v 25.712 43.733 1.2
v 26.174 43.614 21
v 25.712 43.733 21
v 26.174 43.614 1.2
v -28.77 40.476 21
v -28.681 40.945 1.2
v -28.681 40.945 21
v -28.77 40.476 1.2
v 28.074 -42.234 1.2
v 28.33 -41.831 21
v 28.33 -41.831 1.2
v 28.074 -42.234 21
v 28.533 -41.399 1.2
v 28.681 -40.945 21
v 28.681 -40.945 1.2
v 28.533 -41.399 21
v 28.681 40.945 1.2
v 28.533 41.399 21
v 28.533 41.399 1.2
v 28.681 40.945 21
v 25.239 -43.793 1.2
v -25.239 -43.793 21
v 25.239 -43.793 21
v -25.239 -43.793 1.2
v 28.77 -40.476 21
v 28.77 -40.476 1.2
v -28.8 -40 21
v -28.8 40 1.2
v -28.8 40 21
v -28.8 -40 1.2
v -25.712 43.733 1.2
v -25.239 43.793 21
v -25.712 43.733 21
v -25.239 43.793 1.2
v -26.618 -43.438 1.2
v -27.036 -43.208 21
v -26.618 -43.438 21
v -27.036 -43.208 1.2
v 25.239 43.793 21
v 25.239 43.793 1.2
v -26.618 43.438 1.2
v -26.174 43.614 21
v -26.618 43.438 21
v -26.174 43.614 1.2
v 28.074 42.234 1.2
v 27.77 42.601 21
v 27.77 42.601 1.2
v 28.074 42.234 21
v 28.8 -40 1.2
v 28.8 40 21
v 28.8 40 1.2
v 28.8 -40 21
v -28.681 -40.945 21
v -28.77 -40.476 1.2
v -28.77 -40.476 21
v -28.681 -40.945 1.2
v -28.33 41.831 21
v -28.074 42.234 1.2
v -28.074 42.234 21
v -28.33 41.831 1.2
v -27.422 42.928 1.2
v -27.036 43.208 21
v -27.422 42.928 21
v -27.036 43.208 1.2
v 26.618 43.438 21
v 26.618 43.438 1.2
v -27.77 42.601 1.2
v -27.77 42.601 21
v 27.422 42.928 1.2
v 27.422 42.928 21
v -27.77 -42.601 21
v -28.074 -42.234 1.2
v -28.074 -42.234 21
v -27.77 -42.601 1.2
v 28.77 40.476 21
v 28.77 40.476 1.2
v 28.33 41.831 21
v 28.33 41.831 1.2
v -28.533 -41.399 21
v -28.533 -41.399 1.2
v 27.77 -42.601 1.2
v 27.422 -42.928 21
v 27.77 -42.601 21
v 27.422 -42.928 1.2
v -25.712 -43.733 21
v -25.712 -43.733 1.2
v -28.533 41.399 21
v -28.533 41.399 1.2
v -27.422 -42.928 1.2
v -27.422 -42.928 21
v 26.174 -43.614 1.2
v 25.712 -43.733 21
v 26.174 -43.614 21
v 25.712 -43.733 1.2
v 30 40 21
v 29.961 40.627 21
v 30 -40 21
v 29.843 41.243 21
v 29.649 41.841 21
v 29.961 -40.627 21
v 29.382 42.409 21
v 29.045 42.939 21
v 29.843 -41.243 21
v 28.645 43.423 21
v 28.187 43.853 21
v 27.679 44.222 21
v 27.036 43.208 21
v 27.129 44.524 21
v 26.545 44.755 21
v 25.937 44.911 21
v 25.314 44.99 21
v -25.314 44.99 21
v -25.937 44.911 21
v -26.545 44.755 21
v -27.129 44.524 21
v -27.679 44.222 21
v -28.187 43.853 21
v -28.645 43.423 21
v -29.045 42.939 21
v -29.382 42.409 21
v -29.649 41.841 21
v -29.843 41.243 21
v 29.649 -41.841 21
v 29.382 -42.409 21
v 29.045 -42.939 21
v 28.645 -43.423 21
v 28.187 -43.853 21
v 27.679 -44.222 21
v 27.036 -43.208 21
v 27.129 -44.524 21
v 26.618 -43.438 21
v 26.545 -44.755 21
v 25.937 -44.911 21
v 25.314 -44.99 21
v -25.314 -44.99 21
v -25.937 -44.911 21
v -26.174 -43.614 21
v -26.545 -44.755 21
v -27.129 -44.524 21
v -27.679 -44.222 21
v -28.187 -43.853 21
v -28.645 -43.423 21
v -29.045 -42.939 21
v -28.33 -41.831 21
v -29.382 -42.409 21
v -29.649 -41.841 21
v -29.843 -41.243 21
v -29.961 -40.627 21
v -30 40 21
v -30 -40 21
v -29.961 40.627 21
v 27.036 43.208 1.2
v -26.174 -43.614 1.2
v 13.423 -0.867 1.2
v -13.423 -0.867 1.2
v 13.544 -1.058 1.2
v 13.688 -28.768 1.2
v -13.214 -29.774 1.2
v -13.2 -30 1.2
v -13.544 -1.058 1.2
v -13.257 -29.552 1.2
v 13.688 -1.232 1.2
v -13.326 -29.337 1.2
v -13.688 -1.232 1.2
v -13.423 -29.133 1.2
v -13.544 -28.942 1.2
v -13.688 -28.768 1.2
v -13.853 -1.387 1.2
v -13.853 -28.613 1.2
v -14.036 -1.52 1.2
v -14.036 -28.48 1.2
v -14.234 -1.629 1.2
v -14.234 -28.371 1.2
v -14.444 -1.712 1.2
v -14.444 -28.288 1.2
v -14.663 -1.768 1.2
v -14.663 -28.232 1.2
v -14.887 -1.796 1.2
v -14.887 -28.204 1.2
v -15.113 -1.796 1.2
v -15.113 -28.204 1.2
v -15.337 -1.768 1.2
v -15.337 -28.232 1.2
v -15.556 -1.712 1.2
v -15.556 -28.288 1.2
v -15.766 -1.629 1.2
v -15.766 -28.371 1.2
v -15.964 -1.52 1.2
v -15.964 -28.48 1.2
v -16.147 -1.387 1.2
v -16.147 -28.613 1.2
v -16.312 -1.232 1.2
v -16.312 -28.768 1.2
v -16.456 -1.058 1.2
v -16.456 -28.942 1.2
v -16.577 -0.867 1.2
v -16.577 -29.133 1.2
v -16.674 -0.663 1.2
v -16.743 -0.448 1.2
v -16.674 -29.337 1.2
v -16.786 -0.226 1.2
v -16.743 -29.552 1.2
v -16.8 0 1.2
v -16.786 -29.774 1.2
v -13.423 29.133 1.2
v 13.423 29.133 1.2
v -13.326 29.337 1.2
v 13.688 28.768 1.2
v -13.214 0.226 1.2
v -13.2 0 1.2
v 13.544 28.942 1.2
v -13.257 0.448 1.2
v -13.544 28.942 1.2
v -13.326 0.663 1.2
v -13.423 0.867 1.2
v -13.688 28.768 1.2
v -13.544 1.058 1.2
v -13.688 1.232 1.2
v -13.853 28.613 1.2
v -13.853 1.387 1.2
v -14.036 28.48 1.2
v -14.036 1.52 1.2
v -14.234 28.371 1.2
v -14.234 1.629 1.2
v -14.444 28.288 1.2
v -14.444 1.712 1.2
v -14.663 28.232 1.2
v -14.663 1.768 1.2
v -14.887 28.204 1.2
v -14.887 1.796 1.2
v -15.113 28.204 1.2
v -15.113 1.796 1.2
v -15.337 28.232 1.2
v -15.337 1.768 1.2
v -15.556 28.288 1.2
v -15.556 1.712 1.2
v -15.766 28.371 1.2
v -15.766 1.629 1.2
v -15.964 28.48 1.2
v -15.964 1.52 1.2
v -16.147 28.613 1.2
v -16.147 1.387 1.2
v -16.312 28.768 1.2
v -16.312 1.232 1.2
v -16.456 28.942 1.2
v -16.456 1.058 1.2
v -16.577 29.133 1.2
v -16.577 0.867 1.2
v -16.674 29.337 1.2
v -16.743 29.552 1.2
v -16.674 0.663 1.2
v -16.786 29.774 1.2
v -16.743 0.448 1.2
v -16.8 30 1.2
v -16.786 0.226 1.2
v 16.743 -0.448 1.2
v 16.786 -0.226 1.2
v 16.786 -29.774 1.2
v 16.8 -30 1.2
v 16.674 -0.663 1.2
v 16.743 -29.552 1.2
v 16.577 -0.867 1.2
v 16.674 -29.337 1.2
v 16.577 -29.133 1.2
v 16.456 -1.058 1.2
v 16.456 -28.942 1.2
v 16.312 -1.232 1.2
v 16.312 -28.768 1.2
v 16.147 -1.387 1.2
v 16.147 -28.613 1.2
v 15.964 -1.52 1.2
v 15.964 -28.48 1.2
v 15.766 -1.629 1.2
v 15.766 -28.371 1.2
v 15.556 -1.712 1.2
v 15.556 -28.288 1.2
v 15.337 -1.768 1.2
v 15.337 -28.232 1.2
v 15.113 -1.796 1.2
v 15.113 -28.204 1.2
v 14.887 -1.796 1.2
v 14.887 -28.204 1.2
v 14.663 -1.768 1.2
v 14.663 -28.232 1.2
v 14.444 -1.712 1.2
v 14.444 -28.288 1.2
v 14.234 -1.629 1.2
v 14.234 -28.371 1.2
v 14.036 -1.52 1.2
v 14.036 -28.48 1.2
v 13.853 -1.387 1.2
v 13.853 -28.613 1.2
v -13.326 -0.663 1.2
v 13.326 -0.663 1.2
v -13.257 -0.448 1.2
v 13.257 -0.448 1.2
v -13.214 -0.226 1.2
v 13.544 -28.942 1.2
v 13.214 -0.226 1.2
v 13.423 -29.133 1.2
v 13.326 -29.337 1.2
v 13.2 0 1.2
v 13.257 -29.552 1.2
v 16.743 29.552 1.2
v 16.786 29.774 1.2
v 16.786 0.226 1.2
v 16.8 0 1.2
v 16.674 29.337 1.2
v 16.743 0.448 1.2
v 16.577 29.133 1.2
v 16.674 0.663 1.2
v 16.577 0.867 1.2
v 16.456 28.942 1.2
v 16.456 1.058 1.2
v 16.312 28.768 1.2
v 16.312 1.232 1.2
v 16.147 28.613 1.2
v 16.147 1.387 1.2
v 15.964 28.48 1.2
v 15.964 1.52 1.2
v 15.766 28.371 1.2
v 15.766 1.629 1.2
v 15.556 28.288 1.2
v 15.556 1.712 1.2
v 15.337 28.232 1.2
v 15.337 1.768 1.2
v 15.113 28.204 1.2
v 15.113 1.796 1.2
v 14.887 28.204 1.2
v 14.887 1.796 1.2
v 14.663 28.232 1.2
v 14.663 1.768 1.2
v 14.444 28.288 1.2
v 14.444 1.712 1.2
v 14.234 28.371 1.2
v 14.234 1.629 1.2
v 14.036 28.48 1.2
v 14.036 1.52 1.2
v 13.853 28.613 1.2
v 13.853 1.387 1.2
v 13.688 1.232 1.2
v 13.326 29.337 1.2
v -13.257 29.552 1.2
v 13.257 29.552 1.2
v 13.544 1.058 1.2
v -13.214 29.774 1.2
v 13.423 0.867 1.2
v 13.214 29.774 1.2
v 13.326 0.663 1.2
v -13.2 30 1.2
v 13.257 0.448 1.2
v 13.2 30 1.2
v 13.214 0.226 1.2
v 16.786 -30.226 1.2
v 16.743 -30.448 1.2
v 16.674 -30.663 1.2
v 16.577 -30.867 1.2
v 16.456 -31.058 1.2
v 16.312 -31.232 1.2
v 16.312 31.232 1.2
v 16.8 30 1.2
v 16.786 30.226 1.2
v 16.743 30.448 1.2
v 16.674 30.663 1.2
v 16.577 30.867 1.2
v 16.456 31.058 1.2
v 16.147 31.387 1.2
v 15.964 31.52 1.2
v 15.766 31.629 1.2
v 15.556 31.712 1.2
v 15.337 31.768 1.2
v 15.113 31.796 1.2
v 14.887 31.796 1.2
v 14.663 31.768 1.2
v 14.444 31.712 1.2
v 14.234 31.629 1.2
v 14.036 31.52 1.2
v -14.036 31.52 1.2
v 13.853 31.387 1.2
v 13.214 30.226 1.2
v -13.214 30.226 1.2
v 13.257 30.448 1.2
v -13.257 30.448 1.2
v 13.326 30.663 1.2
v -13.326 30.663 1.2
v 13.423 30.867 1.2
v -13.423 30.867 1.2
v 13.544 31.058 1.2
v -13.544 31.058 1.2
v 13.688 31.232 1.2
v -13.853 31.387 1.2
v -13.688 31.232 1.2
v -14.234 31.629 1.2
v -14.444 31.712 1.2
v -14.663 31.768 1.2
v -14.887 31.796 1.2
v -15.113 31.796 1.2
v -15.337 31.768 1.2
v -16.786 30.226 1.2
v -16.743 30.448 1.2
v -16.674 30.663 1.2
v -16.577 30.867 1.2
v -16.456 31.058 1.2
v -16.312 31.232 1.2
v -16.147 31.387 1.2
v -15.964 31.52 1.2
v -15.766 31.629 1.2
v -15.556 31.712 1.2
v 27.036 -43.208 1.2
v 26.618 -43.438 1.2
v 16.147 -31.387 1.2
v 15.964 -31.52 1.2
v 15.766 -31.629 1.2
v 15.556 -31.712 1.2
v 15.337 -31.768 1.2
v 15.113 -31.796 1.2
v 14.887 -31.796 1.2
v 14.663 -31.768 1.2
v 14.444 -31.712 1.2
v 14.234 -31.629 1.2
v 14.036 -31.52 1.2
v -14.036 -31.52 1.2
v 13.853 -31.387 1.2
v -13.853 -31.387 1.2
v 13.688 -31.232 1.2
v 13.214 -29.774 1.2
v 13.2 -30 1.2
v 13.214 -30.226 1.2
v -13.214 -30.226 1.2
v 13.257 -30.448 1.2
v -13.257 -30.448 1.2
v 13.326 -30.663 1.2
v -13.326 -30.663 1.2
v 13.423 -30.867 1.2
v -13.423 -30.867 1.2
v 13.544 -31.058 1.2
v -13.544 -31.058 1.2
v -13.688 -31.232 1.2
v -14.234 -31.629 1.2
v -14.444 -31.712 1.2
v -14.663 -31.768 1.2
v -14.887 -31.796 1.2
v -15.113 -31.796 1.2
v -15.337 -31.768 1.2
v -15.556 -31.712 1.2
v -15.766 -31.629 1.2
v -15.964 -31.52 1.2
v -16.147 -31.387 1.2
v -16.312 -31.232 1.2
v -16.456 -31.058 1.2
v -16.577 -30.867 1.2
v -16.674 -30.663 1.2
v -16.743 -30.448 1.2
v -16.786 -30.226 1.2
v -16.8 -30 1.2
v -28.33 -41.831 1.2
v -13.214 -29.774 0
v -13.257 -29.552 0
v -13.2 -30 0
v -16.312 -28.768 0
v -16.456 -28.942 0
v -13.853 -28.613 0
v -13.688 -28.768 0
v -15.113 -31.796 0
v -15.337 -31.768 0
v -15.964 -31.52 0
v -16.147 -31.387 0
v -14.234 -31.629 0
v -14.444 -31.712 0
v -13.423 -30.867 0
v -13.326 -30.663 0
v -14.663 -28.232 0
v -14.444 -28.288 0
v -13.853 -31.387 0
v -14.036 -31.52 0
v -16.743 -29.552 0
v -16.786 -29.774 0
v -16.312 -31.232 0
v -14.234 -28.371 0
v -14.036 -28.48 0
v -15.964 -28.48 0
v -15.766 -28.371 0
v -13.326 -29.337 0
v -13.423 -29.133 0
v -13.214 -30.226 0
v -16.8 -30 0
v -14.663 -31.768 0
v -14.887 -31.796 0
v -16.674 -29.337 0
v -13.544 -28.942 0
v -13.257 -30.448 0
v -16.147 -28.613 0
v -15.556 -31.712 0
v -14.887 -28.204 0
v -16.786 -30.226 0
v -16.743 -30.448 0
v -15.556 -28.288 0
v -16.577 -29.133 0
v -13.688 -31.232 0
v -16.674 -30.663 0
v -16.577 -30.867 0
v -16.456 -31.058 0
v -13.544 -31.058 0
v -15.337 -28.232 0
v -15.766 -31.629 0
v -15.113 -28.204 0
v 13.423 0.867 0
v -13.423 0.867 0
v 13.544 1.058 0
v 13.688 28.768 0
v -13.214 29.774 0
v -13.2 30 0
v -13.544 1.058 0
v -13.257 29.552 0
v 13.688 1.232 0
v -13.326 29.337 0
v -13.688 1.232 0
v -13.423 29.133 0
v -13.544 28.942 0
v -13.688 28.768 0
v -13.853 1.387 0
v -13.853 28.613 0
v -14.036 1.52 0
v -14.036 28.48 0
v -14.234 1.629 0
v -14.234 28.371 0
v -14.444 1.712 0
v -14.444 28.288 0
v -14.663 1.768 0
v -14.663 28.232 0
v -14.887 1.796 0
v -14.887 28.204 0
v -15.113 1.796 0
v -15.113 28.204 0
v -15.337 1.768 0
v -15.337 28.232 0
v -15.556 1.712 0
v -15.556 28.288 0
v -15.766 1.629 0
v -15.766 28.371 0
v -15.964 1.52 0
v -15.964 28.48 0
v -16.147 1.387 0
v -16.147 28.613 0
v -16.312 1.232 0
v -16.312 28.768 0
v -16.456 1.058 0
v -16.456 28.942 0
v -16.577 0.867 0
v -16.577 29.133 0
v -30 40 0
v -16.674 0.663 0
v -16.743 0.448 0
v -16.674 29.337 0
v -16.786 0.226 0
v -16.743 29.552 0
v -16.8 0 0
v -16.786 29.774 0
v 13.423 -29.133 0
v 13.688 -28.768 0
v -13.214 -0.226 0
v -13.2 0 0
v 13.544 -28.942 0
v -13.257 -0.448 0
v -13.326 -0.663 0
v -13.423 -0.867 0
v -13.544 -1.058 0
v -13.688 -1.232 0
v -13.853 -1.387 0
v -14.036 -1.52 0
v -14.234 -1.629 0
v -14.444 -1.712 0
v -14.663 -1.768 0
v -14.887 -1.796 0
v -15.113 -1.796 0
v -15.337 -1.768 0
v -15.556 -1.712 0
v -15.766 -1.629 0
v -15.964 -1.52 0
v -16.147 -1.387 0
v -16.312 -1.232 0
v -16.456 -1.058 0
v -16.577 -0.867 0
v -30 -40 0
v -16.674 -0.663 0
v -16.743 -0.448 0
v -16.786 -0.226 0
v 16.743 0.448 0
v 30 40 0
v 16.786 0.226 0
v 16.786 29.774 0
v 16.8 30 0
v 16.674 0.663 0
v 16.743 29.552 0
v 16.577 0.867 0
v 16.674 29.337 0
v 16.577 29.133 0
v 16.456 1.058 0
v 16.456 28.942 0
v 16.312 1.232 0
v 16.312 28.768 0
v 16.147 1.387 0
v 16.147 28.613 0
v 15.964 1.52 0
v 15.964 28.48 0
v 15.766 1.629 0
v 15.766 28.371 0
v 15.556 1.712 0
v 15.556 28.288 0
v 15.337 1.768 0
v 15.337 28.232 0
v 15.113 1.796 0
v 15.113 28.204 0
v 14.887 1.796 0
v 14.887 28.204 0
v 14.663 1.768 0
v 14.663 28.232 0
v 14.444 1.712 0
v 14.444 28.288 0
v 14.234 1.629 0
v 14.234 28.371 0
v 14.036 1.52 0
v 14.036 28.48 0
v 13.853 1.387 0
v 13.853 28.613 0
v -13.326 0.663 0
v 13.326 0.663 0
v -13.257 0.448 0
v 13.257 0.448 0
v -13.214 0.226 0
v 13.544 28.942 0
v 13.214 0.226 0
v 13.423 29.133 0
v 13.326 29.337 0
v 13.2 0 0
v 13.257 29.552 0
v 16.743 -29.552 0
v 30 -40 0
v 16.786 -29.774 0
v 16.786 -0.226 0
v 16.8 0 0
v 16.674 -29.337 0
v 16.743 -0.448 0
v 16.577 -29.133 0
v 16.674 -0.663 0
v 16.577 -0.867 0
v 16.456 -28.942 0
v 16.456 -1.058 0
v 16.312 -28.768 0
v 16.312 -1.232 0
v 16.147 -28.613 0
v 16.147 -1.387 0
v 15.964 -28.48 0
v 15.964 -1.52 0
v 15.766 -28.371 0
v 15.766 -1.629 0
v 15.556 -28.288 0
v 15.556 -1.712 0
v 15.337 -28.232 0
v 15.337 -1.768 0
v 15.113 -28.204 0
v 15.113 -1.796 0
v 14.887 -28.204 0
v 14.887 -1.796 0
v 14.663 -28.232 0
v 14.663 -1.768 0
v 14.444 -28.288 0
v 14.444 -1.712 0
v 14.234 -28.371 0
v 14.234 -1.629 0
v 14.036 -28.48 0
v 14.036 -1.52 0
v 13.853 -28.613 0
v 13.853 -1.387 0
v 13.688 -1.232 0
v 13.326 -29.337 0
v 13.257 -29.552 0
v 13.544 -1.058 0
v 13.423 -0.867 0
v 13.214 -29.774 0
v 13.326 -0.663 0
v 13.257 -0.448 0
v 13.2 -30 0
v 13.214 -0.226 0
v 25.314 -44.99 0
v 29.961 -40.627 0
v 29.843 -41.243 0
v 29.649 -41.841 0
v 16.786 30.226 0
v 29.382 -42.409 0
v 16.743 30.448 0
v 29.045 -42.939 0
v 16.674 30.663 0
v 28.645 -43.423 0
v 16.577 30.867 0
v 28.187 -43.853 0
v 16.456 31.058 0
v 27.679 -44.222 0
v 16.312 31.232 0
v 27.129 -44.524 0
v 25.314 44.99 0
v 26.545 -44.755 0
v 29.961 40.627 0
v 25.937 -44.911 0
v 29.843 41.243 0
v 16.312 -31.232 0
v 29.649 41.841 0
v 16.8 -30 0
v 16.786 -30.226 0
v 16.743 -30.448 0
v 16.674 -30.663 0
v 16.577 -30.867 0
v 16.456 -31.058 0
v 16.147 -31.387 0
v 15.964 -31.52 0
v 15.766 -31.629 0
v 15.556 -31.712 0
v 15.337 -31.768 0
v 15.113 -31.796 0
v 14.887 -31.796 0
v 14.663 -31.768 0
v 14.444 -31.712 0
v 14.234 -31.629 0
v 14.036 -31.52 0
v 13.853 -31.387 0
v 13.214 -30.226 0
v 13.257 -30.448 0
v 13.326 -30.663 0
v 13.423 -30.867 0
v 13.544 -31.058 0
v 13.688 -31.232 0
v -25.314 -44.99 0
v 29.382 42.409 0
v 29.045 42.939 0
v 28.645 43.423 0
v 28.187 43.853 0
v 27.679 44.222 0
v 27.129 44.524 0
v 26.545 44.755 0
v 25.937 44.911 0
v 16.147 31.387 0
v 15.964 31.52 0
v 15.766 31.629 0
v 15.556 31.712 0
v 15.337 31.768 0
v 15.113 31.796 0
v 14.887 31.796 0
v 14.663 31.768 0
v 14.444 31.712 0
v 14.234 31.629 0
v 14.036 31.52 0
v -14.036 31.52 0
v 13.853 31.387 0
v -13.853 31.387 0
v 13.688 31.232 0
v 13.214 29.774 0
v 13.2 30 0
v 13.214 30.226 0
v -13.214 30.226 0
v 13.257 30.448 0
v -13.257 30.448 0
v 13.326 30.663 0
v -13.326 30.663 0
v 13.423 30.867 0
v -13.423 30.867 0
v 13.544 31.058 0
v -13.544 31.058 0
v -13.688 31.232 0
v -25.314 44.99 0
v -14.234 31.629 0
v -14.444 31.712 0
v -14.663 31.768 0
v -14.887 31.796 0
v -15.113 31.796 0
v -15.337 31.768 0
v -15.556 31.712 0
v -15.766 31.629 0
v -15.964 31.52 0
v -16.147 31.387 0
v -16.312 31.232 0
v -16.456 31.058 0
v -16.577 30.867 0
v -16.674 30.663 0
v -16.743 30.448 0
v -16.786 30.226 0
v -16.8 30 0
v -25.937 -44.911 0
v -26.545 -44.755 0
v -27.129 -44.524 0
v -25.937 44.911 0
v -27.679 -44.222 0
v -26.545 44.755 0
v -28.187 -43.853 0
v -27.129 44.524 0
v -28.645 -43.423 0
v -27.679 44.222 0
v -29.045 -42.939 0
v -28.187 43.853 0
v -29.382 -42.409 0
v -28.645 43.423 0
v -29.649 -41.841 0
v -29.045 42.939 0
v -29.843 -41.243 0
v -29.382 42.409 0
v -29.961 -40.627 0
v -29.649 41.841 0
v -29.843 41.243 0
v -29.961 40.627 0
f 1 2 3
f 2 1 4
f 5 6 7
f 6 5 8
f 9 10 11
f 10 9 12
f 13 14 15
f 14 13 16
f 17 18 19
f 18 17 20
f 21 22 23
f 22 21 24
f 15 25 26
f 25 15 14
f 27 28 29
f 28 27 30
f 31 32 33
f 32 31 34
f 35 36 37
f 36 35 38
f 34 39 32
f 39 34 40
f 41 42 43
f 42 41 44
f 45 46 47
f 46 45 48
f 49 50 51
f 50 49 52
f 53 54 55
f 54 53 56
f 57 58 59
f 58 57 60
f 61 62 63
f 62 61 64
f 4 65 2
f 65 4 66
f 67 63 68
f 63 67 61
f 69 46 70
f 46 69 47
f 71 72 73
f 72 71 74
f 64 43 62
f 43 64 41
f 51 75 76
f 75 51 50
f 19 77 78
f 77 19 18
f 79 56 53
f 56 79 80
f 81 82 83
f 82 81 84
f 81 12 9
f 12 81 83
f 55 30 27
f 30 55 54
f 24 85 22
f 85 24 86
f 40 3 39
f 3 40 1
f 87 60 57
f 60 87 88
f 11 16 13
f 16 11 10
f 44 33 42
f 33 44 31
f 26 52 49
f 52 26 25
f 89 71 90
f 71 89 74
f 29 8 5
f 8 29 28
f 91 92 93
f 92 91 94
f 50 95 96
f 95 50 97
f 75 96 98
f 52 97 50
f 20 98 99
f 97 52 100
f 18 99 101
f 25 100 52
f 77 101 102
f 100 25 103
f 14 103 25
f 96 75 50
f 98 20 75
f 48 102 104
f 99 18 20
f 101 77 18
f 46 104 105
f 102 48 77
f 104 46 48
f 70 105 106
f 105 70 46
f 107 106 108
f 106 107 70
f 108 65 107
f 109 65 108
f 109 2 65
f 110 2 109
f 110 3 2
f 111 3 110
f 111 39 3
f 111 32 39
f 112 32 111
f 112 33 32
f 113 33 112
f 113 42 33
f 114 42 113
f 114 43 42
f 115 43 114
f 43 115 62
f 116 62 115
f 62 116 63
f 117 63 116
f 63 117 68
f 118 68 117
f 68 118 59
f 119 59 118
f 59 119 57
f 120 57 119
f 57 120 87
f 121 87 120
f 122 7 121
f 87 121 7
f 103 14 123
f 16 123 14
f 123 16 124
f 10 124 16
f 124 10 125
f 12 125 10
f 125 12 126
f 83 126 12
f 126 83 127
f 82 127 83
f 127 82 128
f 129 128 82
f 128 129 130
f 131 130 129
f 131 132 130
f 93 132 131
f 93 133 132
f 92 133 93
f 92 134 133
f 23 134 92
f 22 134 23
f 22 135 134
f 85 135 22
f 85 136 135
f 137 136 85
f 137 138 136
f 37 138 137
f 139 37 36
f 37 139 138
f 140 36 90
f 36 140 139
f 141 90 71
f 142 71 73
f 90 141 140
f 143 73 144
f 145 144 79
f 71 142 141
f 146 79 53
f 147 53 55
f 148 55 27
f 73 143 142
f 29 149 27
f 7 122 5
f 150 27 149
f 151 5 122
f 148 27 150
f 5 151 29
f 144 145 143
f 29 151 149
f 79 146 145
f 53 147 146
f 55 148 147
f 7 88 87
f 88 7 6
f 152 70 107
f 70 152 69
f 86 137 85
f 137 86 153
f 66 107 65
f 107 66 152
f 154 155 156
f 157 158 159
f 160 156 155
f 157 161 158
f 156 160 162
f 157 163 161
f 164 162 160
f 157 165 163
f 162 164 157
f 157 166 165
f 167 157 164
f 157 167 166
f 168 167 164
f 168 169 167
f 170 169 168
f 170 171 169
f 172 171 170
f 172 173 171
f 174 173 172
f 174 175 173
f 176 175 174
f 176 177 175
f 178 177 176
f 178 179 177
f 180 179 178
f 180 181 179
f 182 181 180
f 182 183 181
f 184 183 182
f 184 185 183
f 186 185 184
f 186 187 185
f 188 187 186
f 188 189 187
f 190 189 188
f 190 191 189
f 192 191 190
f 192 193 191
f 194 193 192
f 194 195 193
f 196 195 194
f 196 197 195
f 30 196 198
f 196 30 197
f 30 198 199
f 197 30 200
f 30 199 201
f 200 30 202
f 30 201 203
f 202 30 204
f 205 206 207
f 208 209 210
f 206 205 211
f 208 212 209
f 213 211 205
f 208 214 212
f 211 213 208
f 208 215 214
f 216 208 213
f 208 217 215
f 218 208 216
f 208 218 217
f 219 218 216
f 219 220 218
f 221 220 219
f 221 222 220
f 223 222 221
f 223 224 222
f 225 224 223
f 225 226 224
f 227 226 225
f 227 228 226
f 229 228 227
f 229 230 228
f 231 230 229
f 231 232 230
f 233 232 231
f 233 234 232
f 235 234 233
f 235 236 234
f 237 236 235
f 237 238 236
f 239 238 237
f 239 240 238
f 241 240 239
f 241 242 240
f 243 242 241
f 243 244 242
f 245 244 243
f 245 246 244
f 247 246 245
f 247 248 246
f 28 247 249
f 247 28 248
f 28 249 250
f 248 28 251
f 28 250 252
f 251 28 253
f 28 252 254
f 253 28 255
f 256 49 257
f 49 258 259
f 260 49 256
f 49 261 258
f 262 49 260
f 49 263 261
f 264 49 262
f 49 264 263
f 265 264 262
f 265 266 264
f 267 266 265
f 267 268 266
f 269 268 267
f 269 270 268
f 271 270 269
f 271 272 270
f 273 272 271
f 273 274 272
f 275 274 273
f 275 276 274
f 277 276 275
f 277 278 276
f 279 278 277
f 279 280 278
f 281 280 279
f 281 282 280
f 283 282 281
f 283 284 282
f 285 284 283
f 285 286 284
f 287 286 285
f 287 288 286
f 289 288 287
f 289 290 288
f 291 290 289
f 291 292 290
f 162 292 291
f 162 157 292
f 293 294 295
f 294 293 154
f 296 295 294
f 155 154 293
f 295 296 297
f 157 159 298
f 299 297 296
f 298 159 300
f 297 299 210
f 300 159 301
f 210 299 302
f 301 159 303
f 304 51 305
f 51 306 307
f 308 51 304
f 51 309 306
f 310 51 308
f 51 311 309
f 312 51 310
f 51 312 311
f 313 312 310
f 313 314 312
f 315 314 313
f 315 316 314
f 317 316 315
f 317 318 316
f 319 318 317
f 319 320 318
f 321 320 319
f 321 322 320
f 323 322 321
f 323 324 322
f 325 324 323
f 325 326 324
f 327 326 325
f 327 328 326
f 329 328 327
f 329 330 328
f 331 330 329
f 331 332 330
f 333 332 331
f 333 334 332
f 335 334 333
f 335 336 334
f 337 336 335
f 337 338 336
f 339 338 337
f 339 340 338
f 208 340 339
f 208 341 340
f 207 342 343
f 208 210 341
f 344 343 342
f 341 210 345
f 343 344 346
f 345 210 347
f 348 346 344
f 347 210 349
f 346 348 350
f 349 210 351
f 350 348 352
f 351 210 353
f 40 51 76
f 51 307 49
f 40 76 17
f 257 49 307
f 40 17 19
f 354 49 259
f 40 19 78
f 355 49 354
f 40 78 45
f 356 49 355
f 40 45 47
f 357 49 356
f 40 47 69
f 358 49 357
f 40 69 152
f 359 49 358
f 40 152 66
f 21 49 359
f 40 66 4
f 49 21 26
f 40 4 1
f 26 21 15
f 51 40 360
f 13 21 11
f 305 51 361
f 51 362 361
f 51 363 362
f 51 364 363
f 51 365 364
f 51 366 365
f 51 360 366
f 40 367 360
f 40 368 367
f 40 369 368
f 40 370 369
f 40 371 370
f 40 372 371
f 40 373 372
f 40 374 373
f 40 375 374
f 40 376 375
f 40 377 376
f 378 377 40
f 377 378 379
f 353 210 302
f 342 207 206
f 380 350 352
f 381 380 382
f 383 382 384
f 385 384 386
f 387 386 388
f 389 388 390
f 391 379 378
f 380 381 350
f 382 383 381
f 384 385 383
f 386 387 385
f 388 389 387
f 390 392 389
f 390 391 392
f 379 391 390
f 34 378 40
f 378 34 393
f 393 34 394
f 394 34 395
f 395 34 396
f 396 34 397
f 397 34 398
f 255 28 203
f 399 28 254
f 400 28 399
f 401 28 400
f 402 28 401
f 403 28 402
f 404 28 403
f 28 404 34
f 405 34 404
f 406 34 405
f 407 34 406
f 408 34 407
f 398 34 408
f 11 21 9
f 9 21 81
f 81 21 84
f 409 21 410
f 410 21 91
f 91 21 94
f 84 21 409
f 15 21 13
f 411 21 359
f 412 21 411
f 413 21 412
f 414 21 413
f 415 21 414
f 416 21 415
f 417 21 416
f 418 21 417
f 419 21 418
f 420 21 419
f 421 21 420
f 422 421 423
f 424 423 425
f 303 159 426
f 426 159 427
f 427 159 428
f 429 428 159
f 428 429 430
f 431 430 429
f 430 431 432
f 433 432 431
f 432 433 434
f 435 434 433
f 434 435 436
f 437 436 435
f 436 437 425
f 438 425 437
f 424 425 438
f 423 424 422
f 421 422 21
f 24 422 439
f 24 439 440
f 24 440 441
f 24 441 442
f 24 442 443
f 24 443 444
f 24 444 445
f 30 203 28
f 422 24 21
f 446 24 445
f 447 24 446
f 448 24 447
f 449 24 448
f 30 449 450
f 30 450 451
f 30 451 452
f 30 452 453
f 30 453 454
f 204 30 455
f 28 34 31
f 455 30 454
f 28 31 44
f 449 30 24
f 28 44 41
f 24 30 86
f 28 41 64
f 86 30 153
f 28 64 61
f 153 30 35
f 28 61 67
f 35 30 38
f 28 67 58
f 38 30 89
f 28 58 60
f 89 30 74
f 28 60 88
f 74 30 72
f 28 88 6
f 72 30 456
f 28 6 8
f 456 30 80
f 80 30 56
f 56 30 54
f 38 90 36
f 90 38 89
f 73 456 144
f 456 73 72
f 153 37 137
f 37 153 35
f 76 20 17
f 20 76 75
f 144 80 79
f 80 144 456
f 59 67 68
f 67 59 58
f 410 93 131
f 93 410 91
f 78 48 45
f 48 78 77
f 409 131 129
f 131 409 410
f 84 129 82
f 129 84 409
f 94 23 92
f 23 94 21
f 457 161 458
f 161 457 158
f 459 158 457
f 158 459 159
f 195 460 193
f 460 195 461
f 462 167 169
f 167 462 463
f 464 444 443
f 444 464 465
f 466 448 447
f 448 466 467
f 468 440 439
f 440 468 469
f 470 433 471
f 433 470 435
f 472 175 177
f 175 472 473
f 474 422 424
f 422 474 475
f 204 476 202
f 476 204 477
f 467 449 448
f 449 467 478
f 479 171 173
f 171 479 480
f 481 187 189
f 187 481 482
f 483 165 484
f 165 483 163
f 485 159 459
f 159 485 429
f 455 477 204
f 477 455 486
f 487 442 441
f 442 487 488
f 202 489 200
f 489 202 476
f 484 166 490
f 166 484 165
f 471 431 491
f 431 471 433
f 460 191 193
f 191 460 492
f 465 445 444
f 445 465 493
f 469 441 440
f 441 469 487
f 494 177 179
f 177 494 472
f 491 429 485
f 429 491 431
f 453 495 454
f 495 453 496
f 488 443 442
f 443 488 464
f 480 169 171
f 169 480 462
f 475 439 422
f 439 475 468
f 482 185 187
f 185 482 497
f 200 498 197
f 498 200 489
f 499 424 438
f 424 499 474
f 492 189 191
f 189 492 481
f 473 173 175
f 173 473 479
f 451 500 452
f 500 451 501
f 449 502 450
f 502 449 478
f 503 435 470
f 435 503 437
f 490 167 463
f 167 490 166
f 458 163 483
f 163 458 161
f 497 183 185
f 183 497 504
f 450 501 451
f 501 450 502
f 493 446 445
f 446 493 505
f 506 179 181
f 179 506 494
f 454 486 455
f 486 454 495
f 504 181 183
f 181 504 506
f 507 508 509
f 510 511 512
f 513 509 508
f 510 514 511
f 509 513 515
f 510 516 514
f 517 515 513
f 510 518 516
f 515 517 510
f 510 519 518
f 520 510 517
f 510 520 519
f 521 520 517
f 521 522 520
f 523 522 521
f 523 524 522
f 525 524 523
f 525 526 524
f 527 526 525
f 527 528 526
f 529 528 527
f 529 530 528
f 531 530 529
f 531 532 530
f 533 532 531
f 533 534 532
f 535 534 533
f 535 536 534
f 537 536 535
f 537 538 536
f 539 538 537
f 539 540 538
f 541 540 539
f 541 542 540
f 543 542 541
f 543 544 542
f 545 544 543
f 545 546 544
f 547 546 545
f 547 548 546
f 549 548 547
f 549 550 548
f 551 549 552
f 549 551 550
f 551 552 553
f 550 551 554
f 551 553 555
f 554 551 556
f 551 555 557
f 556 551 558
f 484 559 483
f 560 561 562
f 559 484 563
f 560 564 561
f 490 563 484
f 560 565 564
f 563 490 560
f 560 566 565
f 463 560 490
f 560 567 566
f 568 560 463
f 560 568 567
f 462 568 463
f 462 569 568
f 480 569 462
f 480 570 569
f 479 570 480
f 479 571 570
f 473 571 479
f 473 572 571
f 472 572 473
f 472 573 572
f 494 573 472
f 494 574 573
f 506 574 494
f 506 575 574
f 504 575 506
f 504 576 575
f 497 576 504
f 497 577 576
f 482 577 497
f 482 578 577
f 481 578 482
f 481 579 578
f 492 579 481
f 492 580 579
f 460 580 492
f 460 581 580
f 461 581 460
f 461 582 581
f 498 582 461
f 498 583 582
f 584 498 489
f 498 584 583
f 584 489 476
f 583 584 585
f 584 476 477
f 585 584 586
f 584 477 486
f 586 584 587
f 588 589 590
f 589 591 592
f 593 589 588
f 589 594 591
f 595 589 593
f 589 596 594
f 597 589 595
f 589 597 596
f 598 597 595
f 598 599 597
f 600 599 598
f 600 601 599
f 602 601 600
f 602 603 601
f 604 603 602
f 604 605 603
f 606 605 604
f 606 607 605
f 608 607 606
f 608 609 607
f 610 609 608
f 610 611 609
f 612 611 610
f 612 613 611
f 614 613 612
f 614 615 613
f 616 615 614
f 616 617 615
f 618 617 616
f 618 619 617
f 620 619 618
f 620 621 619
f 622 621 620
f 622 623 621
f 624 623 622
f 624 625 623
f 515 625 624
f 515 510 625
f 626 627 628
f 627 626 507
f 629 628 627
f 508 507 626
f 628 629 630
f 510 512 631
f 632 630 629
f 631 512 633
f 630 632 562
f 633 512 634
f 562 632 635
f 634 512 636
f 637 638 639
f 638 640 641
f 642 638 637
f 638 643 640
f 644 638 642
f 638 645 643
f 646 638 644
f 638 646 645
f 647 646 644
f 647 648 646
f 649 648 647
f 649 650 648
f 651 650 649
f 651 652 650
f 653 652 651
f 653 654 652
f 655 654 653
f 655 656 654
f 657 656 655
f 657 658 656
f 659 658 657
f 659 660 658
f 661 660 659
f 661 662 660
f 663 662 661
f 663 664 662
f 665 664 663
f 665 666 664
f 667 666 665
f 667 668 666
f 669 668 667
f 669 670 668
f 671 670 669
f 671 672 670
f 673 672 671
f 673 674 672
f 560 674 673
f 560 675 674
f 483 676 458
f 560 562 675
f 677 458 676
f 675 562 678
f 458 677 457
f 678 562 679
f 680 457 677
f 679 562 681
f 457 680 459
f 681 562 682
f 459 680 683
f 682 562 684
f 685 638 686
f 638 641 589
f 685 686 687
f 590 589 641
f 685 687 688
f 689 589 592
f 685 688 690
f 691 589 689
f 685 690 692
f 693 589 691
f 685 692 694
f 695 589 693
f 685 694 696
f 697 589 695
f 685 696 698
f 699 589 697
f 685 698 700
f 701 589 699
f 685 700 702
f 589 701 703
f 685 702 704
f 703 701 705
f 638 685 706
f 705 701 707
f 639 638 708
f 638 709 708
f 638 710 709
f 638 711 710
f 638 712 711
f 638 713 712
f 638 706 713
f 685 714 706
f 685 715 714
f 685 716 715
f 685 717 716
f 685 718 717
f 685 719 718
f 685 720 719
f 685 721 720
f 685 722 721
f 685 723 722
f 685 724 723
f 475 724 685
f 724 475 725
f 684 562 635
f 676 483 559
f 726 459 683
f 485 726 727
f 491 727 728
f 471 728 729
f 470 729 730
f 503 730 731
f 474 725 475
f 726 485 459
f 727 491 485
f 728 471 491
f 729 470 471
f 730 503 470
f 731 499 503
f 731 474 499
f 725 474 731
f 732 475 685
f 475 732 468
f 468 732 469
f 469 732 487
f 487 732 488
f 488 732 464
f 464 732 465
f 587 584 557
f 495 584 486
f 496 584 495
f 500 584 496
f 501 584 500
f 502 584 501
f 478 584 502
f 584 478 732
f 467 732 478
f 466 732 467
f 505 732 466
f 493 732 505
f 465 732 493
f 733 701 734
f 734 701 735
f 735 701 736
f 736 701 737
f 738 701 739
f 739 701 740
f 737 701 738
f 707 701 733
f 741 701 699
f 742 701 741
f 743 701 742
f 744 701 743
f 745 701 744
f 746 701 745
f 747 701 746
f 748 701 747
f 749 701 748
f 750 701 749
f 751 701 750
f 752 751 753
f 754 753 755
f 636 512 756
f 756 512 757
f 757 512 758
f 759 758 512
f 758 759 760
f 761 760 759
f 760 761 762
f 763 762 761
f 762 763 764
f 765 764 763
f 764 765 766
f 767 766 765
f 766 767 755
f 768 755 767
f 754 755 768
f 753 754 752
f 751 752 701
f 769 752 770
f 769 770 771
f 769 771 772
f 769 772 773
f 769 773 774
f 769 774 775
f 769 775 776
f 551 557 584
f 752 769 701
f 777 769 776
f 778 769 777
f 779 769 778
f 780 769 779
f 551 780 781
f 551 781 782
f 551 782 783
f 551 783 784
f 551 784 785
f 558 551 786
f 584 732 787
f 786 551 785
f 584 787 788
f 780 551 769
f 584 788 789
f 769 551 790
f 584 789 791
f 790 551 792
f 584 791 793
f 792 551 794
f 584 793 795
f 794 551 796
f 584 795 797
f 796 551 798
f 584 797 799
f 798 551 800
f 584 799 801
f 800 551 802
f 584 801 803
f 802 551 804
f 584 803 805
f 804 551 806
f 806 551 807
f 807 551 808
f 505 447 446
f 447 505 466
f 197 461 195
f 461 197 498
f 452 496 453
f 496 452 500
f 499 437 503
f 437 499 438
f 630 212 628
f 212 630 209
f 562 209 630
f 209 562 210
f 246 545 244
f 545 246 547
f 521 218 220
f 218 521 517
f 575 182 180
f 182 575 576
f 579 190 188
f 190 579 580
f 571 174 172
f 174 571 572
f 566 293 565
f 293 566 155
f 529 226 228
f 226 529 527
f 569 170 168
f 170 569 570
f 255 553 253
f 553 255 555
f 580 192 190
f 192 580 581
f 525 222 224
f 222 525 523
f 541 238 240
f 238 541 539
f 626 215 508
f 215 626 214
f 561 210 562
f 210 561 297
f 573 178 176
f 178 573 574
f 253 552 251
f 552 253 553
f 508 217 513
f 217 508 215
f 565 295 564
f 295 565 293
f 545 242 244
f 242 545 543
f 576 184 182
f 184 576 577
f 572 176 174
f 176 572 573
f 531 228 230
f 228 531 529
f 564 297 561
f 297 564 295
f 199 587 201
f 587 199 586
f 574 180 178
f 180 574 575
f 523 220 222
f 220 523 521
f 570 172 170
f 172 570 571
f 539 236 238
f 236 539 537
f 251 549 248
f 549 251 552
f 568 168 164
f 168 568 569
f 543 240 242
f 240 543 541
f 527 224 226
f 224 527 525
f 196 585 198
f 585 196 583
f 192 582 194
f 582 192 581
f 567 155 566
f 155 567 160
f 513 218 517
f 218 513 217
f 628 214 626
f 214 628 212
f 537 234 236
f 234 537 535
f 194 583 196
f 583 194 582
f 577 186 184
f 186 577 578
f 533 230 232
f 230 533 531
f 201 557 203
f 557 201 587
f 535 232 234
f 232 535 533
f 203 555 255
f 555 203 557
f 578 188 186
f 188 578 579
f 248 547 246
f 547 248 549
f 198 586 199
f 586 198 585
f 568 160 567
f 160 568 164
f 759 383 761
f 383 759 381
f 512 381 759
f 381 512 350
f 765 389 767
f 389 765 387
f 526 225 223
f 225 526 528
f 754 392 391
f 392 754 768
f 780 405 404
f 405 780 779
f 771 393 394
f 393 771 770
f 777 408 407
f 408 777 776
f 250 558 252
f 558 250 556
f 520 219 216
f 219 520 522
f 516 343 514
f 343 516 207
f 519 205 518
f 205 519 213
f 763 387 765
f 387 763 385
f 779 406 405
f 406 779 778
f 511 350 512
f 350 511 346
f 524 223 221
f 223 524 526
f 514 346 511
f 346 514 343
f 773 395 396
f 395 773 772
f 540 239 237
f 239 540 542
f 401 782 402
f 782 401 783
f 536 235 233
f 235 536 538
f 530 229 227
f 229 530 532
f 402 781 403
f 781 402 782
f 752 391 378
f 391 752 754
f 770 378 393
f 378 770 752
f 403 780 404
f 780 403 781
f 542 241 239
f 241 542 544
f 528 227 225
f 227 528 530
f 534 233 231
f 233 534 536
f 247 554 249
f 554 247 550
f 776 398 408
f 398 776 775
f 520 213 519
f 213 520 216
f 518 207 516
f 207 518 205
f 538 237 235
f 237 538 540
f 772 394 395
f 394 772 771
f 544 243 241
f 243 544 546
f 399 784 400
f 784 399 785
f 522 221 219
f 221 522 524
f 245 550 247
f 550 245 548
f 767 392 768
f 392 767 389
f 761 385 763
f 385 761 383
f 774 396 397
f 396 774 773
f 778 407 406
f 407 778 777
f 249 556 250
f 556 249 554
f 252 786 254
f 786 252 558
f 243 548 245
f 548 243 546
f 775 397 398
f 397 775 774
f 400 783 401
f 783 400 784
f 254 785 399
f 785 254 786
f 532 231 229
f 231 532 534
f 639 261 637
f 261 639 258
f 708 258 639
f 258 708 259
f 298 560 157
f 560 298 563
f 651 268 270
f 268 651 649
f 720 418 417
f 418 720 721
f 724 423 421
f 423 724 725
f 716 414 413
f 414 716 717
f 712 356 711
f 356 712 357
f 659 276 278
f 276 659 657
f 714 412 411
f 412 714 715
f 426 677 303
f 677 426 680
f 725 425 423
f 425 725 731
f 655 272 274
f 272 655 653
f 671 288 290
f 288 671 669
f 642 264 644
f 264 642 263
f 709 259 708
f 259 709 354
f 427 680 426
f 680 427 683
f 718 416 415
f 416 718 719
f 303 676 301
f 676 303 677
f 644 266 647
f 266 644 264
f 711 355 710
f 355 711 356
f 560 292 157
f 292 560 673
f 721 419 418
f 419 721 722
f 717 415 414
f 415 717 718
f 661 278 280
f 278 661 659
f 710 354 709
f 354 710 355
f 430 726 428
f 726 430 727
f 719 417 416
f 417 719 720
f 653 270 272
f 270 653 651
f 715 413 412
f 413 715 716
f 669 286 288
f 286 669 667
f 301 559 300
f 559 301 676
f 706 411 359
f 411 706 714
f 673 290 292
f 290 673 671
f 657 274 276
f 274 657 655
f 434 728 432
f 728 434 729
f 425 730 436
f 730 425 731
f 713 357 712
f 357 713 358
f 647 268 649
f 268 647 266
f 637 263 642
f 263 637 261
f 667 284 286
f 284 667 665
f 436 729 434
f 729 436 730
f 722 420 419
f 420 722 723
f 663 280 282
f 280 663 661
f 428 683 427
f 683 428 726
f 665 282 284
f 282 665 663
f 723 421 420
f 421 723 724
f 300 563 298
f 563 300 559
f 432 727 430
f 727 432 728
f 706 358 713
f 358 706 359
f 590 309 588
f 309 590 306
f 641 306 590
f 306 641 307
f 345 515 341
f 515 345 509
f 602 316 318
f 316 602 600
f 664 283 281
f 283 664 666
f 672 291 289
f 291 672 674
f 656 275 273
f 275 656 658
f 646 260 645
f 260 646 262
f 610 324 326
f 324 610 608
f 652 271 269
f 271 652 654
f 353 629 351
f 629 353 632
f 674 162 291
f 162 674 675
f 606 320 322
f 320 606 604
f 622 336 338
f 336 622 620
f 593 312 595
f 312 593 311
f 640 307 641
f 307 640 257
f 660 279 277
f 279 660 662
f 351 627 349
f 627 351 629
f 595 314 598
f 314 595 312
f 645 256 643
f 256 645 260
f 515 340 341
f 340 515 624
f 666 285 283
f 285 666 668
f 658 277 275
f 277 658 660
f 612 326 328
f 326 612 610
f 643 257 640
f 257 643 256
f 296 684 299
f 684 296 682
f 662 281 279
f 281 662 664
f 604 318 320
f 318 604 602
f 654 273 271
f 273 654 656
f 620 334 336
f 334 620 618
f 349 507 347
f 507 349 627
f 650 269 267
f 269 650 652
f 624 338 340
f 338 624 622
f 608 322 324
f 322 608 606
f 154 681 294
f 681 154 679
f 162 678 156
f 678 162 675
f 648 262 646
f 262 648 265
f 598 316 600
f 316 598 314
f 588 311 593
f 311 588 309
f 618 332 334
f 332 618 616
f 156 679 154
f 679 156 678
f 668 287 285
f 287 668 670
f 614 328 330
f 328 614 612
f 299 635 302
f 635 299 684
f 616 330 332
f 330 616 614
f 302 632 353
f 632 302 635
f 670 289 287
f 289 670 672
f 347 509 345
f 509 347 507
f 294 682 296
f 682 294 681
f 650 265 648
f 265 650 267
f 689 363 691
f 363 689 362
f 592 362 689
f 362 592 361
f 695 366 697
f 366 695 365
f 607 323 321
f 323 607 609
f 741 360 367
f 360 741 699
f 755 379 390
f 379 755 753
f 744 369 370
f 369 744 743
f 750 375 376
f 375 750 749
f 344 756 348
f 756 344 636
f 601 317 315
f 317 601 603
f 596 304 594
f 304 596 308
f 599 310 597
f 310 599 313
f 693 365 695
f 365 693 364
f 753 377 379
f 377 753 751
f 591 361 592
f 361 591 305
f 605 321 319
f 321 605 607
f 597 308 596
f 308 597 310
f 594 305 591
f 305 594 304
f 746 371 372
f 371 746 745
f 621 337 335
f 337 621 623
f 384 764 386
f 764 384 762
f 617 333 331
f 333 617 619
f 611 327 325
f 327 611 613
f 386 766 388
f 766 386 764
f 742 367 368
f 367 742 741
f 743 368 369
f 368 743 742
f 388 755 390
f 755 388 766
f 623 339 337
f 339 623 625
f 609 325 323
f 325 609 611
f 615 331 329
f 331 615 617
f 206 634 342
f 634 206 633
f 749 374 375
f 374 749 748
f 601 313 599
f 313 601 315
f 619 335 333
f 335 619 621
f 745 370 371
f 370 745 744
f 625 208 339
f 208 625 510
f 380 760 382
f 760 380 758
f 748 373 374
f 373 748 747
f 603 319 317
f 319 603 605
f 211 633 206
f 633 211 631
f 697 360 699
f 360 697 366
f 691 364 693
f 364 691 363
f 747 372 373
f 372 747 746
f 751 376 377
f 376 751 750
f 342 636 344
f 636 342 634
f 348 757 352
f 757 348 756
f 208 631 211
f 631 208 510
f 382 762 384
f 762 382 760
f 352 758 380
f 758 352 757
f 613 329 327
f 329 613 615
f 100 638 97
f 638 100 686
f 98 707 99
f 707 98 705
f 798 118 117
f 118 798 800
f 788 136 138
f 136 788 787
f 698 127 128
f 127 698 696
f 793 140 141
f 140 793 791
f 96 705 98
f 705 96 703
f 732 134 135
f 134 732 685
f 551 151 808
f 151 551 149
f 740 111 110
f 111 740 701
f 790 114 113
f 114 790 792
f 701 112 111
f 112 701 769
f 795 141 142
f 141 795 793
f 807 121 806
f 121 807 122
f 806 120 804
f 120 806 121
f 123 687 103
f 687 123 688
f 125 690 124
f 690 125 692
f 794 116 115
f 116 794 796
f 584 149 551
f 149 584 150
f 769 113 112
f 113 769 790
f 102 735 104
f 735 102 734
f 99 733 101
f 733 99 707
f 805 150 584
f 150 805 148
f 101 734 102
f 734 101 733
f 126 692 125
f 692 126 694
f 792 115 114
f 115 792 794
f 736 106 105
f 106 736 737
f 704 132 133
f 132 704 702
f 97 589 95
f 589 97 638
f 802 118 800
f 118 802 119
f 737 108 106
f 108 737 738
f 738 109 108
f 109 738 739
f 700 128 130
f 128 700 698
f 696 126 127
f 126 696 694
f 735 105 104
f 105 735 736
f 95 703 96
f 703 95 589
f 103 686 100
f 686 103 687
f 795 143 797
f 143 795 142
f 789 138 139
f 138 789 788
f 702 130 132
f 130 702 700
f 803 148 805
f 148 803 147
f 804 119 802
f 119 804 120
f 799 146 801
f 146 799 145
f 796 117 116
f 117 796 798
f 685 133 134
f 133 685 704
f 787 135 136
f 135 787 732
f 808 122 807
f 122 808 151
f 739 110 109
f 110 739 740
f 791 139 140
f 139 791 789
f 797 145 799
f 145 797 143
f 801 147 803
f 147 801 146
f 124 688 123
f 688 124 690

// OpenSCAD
$fn = 50;


difference() {
	union() {
		hull() {
			translate(v = [-25.0000000000, 40.0000000000, 0]) {
				cylinder(h = 21, r = 5);
			}
			translate(v = [25.0000000000, 40.0000000000, 0]) {
				cylinder(h = 21, r = 5);
			}
			translate(v = [-25.0000000000, -40.0000000000, 0]) {
				cylinder(h = 21, r = 5);
			}
			translate(v = [25.0000000000, -40.0000000000, 0]) {
				cylinder(h = 21, r = 5);
			}
		}
	}
	union() {
		translate(v = [0, 0, 1.2000000000]) {
			hull() {
				translate(v = [-25.0000000000, 40.0000000000, 0]) {
					cylinder(h = 19.8000000000, r = 3.8000000000);
				}
				translate(v = [25.0000000000, 40.0000000000, 0]) {
					cylinder(h = 19.8000000000, r = 3.8000000000);
				}
				translate(v = [-25.0000000000, -40.0000000000, 0]) {
					cylinder(h = 19.8000000000, r = 3.8000000000);
				}
				translate(v = [25.0000000000, -40.0000000000, 0]) {
					cylinder(h = 19.8000000000, r = 3.8000000000);
				}
			}
		}
		#translate(v = [-15.0000000000, -30.0000000000, 0]) {
			cylinder(h = 1.2000000000, r = 1.8000000000);
		}
		#translate(v = [-15.0000000000, 0.0000000000, 0]) {
			cylinder(h = 1.2000000000, r = 1.8000000000);
		}
		#translate(v = [-15.0000000000, 30.0000000000, 0]) {
			cylinder(h = 1.2000000000, r = 1.8000000000);
		}
		#translate(v = [15.0000000000, -30.0000000000, 0]) {
			cylinder(h = 1.2000000000, r = 1.8000000000);
		}
		#translate(v = [15.0000000000, 0.0000000000, 0]) {
			cylinder(h = 1.2000000000, r = 1.8000000000);
		}
		#translate(v = [15.0000000000, 30.0000000000, 0]) {
			cylinder(h = 1.2000000000, r = 1.8000000000);
		}
	}
}
